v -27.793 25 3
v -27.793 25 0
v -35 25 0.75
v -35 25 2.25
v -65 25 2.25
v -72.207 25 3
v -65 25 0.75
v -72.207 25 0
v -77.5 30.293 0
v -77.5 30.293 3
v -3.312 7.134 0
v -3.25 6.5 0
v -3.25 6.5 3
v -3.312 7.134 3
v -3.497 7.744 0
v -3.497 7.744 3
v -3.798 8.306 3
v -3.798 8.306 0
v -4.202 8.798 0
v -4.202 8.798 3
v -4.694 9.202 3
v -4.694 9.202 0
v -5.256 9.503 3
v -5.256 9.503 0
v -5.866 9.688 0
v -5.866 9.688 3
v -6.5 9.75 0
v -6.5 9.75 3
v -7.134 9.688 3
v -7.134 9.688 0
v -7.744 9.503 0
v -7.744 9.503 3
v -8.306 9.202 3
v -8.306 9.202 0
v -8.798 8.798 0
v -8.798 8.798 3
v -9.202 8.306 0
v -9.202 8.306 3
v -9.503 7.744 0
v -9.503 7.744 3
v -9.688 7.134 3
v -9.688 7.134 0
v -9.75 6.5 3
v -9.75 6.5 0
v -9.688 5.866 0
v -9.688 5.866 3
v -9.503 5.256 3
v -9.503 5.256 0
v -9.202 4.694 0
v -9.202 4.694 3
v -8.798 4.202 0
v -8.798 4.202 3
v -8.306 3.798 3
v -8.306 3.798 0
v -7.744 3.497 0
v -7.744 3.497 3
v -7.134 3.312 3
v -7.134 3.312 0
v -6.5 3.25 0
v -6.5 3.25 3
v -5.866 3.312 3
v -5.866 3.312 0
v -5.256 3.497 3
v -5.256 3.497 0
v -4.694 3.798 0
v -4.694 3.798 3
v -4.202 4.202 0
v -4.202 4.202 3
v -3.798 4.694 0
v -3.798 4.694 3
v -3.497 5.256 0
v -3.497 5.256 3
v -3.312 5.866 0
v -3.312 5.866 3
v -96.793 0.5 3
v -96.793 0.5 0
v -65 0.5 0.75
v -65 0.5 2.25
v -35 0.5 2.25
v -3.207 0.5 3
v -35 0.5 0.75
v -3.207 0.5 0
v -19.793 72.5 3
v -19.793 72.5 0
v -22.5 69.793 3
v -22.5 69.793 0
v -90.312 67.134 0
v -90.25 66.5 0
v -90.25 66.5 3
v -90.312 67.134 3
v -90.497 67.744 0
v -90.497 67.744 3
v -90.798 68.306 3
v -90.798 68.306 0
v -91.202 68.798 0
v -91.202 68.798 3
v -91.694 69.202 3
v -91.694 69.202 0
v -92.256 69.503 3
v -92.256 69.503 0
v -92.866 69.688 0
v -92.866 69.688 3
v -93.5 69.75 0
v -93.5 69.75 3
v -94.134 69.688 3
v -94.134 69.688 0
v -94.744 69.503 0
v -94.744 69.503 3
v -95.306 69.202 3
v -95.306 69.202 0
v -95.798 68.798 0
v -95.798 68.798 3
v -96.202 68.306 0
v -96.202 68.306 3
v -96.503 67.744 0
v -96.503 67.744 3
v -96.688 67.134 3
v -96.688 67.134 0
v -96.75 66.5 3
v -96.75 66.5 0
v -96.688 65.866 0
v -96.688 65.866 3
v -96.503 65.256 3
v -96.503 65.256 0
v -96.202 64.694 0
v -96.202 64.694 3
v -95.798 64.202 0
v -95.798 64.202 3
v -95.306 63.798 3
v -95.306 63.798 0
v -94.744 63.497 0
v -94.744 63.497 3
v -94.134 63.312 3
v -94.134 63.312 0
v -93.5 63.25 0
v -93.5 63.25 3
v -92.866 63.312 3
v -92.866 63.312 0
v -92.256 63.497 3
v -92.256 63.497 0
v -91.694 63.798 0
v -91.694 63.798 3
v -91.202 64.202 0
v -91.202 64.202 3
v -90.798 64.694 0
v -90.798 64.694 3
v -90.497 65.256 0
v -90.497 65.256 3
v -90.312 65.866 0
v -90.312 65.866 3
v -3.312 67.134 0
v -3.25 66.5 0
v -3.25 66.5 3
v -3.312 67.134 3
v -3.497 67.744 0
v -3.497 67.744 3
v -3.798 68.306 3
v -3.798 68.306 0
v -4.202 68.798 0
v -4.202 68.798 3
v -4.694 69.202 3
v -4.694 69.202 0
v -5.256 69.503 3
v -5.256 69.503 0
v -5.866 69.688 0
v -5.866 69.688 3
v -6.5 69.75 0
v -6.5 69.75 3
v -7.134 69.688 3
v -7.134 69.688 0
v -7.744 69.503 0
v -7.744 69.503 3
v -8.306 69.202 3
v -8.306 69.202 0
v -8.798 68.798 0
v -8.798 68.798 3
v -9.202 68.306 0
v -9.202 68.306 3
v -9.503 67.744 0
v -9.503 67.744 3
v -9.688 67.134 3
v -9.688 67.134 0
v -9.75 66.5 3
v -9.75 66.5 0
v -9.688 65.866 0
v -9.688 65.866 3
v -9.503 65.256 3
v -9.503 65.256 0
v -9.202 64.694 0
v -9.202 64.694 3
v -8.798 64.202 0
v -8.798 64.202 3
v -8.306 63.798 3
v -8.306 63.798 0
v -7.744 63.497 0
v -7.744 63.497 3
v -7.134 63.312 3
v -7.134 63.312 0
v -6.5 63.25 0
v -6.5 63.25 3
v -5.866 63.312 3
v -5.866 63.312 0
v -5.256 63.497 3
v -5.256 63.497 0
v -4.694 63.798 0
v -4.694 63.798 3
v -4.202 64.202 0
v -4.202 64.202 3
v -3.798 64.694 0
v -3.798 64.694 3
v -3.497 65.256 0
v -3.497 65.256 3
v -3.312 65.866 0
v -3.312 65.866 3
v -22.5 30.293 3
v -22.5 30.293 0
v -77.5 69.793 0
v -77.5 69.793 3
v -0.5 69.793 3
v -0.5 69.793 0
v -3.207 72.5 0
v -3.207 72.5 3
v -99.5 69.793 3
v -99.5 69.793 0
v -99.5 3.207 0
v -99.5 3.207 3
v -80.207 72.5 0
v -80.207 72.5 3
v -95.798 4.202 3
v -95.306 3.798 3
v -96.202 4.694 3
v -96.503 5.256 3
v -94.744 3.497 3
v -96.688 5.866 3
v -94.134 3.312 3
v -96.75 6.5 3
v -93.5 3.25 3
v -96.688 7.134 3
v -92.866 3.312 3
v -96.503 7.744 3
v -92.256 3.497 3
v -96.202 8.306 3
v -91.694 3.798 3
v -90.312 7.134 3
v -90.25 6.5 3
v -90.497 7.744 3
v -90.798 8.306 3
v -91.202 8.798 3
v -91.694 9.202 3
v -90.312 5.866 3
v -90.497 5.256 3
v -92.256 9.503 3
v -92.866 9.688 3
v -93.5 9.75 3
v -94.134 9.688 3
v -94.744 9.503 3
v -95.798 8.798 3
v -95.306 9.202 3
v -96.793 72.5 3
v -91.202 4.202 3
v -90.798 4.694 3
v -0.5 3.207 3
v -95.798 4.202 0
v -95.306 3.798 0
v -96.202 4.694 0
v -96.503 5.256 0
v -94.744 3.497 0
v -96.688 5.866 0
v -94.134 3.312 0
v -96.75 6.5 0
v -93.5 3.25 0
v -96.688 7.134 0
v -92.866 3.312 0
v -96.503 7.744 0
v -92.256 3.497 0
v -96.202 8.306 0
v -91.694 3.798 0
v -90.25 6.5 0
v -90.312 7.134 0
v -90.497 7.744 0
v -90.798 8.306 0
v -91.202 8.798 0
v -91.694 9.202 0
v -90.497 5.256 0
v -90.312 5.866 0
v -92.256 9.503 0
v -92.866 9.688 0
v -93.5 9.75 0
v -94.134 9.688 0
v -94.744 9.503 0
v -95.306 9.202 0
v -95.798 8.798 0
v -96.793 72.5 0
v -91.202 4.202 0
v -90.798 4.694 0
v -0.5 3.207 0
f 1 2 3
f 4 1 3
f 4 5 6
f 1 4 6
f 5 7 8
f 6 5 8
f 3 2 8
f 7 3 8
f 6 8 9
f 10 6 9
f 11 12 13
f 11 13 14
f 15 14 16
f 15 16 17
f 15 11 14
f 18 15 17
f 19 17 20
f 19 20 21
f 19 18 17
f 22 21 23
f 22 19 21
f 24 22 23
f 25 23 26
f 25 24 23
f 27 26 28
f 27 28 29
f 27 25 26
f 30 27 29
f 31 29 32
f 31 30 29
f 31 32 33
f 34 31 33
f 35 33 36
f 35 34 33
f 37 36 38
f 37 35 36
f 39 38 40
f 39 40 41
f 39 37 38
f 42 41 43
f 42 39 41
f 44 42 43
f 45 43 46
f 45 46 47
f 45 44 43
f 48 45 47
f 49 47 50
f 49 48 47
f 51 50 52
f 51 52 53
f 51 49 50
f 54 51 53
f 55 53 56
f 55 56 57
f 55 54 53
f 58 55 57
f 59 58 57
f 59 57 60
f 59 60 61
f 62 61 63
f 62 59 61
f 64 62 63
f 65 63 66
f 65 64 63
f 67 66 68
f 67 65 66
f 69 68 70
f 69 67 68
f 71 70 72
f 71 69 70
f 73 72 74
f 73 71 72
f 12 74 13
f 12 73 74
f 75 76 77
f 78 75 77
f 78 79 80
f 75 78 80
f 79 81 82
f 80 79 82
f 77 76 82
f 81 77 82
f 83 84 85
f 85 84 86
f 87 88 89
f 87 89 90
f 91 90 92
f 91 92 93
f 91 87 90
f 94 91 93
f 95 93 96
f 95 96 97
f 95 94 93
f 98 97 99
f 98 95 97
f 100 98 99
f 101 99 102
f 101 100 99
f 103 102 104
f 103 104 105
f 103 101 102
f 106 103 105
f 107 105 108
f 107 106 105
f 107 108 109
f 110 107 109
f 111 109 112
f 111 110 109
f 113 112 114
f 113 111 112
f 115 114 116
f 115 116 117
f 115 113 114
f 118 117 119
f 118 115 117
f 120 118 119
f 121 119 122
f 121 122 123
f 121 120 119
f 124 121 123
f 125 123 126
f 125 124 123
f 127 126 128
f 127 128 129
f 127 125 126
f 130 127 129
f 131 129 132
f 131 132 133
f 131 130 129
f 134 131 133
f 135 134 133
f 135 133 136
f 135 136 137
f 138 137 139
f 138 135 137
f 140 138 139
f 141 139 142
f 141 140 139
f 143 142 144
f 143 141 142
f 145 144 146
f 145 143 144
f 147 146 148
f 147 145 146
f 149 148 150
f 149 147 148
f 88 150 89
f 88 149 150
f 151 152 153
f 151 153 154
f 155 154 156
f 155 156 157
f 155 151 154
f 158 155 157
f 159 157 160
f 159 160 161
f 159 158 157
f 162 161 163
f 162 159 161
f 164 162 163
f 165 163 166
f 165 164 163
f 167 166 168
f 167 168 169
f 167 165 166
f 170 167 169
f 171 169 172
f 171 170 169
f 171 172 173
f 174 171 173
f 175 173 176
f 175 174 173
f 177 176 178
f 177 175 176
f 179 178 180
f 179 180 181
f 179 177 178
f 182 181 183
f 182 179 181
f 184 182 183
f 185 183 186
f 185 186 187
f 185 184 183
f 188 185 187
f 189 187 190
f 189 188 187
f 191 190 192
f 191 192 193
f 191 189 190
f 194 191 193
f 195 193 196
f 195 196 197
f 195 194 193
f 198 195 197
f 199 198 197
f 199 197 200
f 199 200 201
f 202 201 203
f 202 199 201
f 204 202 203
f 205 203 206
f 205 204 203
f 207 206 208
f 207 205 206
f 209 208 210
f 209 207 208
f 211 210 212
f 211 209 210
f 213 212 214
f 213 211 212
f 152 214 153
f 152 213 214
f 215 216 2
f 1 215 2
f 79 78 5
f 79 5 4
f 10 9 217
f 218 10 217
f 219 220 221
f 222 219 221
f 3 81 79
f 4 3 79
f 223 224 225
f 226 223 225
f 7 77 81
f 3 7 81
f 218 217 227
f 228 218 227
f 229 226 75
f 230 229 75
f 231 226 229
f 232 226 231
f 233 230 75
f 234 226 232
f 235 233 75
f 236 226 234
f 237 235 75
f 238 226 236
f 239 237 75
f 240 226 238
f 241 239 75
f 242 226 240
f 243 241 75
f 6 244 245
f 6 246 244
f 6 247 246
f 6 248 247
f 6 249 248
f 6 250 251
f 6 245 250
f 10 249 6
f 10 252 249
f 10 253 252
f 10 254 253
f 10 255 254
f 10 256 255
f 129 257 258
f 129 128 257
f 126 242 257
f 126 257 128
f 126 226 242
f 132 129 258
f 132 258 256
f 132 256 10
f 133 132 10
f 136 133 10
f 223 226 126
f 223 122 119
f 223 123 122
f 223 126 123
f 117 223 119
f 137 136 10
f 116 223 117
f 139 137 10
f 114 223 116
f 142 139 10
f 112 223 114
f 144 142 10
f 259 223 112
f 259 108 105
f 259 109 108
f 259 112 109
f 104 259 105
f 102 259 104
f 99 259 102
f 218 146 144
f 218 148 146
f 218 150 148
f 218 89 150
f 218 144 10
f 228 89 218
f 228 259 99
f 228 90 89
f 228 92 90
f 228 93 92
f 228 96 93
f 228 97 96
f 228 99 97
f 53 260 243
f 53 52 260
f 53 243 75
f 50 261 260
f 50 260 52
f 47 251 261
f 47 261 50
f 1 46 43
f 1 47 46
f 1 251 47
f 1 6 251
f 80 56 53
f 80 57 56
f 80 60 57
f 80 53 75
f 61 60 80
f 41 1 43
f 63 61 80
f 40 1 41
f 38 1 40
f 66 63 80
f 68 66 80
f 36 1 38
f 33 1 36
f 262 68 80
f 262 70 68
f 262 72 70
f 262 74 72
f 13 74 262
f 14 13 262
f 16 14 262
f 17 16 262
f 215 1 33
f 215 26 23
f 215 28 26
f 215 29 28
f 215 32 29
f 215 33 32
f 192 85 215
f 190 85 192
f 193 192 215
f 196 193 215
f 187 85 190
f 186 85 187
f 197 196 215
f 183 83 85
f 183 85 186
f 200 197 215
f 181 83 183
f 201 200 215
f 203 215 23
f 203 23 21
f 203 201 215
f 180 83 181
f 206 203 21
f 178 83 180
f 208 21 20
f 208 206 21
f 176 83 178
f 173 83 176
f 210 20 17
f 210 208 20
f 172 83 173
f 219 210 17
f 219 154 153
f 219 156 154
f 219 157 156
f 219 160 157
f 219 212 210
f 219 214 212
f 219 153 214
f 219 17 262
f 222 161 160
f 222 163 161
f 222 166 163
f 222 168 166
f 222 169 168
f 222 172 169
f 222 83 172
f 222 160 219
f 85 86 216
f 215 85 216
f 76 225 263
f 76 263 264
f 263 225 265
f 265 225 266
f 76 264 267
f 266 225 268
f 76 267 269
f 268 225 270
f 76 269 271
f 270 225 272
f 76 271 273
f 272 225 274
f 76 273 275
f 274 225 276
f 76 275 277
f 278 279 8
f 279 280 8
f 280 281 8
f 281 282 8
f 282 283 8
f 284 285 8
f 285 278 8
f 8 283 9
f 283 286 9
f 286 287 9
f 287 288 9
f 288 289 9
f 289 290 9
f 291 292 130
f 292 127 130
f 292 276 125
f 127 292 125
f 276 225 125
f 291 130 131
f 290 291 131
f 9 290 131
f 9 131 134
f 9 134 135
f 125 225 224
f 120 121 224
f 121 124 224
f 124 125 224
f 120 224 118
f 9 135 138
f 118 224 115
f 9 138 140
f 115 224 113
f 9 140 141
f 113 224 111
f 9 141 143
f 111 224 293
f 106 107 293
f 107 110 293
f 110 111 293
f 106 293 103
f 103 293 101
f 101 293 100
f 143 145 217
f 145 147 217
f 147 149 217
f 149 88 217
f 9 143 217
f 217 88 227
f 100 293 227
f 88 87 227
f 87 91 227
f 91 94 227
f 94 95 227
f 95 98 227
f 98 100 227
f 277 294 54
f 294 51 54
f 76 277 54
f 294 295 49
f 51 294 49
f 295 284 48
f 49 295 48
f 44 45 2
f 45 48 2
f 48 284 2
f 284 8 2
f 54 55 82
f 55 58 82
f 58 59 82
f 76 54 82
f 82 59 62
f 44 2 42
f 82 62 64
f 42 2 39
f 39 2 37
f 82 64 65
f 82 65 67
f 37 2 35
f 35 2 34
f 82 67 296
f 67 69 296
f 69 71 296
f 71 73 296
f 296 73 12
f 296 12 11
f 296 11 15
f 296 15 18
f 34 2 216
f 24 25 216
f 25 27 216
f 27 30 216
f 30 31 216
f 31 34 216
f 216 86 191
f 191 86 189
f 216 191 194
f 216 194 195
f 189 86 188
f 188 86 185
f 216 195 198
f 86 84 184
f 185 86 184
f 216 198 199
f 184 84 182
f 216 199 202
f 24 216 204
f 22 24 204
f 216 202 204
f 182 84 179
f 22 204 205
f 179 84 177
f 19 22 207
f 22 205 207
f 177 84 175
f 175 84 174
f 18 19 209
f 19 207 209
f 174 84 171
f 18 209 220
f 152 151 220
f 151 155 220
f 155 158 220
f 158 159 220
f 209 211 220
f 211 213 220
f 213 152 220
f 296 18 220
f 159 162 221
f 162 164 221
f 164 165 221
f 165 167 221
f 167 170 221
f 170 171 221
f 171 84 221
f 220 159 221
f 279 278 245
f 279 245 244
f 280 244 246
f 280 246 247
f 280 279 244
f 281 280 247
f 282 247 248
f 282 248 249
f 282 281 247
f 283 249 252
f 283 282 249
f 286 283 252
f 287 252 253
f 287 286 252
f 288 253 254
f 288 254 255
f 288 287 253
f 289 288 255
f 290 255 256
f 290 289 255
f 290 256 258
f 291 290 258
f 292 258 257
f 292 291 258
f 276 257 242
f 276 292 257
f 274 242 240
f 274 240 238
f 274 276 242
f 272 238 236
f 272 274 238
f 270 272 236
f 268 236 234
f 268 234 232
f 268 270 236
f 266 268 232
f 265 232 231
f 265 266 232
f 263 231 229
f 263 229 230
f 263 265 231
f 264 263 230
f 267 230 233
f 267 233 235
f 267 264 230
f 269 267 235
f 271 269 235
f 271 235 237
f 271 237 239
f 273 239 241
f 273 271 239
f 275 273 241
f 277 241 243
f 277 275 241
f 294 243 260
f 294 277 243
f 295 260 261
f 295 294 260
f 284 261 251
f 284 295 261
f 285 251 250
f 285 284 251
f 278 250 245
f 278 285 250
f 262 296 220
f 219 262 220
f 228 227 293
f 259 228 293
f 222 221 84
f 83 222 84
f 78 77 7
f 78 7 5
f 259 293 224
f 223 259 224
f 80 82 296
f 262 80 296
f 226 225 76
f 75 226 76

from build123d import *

# Parameters (mm, degrees)
SKETCH1_R           = 3.25
BOSS_EXTRUDE1_DEPTH = 3
CUT_EXTRUDE1_REACH  = 124.855
SKETCH2_W           = 30
SKETCH2_H           = 1.5


with BuildPart() as part:
    # Sketch1 → Boss-Extrude1 (new body)
    with BuildSketch(Plane.XY):
        Polygon((-27.792893219, 25), (-45.5, 25), (-72.207106781, 25), (-77.5, 30.292893219), (-77.5, 69.792893219), (-80.207106781, 72.5), (-96.792893219, 72.5), (-99.5, 69.792893219), (-99.5, 3.207106781), (-96.792893219, 0.5), (-50.760240095, 0.5), (-3.207106781, 0.5), (-0.5, 3.207106781), (-0.5, 69.792893219), (-3.207106781, 72.5), (-19.792893219, 72.5), (-22.5, 69.792893219), (-22.5, 30.292893219), align=None)
        with Locations((-6.5, 66.5)):
            Circle(SKETCH1_R, mode=Mode.SUBTRACT)
        with Locations((-6.5, 6.5)):
            Circle(SKETCH1_R, mode=Mode.SUBTRACT)
        with Locations((-93.5, 6.5)):
            Circle(SKETCH1_R, mode=Mode.SUBTRACT)
        with Locations((-93.5, 66.5)):
            Circle(SKETCH1_R, mode=Mode.SUBTRACT)
    extrude(amount=BOSS_EXTRUDE1_DEPTH)

    # Sketch2 → Cut-Extrude1 (cut, up to next)
    with BuildSketch(Plane.XZ.offset(-0.5), mode=Mode.PRIVATE) as cut_extrude1_sk1:
        with Locations((-50, 1.5)):
            Rectangle(SKETCH2_W, SKETCH2_H)
    cut_extrude1_tool1 = extrude(cut_extrude1_sk1.sketch, amount=-CUT_EXTRUDE1_REACH, mode=Mode.PRIVATE) & part.part
    add(cut_extrude1_tool1.solids().sort_by_distance((-50, 0.5, 1.5))[0], mode=Mode.SUBTRACT)


solid = part.part
